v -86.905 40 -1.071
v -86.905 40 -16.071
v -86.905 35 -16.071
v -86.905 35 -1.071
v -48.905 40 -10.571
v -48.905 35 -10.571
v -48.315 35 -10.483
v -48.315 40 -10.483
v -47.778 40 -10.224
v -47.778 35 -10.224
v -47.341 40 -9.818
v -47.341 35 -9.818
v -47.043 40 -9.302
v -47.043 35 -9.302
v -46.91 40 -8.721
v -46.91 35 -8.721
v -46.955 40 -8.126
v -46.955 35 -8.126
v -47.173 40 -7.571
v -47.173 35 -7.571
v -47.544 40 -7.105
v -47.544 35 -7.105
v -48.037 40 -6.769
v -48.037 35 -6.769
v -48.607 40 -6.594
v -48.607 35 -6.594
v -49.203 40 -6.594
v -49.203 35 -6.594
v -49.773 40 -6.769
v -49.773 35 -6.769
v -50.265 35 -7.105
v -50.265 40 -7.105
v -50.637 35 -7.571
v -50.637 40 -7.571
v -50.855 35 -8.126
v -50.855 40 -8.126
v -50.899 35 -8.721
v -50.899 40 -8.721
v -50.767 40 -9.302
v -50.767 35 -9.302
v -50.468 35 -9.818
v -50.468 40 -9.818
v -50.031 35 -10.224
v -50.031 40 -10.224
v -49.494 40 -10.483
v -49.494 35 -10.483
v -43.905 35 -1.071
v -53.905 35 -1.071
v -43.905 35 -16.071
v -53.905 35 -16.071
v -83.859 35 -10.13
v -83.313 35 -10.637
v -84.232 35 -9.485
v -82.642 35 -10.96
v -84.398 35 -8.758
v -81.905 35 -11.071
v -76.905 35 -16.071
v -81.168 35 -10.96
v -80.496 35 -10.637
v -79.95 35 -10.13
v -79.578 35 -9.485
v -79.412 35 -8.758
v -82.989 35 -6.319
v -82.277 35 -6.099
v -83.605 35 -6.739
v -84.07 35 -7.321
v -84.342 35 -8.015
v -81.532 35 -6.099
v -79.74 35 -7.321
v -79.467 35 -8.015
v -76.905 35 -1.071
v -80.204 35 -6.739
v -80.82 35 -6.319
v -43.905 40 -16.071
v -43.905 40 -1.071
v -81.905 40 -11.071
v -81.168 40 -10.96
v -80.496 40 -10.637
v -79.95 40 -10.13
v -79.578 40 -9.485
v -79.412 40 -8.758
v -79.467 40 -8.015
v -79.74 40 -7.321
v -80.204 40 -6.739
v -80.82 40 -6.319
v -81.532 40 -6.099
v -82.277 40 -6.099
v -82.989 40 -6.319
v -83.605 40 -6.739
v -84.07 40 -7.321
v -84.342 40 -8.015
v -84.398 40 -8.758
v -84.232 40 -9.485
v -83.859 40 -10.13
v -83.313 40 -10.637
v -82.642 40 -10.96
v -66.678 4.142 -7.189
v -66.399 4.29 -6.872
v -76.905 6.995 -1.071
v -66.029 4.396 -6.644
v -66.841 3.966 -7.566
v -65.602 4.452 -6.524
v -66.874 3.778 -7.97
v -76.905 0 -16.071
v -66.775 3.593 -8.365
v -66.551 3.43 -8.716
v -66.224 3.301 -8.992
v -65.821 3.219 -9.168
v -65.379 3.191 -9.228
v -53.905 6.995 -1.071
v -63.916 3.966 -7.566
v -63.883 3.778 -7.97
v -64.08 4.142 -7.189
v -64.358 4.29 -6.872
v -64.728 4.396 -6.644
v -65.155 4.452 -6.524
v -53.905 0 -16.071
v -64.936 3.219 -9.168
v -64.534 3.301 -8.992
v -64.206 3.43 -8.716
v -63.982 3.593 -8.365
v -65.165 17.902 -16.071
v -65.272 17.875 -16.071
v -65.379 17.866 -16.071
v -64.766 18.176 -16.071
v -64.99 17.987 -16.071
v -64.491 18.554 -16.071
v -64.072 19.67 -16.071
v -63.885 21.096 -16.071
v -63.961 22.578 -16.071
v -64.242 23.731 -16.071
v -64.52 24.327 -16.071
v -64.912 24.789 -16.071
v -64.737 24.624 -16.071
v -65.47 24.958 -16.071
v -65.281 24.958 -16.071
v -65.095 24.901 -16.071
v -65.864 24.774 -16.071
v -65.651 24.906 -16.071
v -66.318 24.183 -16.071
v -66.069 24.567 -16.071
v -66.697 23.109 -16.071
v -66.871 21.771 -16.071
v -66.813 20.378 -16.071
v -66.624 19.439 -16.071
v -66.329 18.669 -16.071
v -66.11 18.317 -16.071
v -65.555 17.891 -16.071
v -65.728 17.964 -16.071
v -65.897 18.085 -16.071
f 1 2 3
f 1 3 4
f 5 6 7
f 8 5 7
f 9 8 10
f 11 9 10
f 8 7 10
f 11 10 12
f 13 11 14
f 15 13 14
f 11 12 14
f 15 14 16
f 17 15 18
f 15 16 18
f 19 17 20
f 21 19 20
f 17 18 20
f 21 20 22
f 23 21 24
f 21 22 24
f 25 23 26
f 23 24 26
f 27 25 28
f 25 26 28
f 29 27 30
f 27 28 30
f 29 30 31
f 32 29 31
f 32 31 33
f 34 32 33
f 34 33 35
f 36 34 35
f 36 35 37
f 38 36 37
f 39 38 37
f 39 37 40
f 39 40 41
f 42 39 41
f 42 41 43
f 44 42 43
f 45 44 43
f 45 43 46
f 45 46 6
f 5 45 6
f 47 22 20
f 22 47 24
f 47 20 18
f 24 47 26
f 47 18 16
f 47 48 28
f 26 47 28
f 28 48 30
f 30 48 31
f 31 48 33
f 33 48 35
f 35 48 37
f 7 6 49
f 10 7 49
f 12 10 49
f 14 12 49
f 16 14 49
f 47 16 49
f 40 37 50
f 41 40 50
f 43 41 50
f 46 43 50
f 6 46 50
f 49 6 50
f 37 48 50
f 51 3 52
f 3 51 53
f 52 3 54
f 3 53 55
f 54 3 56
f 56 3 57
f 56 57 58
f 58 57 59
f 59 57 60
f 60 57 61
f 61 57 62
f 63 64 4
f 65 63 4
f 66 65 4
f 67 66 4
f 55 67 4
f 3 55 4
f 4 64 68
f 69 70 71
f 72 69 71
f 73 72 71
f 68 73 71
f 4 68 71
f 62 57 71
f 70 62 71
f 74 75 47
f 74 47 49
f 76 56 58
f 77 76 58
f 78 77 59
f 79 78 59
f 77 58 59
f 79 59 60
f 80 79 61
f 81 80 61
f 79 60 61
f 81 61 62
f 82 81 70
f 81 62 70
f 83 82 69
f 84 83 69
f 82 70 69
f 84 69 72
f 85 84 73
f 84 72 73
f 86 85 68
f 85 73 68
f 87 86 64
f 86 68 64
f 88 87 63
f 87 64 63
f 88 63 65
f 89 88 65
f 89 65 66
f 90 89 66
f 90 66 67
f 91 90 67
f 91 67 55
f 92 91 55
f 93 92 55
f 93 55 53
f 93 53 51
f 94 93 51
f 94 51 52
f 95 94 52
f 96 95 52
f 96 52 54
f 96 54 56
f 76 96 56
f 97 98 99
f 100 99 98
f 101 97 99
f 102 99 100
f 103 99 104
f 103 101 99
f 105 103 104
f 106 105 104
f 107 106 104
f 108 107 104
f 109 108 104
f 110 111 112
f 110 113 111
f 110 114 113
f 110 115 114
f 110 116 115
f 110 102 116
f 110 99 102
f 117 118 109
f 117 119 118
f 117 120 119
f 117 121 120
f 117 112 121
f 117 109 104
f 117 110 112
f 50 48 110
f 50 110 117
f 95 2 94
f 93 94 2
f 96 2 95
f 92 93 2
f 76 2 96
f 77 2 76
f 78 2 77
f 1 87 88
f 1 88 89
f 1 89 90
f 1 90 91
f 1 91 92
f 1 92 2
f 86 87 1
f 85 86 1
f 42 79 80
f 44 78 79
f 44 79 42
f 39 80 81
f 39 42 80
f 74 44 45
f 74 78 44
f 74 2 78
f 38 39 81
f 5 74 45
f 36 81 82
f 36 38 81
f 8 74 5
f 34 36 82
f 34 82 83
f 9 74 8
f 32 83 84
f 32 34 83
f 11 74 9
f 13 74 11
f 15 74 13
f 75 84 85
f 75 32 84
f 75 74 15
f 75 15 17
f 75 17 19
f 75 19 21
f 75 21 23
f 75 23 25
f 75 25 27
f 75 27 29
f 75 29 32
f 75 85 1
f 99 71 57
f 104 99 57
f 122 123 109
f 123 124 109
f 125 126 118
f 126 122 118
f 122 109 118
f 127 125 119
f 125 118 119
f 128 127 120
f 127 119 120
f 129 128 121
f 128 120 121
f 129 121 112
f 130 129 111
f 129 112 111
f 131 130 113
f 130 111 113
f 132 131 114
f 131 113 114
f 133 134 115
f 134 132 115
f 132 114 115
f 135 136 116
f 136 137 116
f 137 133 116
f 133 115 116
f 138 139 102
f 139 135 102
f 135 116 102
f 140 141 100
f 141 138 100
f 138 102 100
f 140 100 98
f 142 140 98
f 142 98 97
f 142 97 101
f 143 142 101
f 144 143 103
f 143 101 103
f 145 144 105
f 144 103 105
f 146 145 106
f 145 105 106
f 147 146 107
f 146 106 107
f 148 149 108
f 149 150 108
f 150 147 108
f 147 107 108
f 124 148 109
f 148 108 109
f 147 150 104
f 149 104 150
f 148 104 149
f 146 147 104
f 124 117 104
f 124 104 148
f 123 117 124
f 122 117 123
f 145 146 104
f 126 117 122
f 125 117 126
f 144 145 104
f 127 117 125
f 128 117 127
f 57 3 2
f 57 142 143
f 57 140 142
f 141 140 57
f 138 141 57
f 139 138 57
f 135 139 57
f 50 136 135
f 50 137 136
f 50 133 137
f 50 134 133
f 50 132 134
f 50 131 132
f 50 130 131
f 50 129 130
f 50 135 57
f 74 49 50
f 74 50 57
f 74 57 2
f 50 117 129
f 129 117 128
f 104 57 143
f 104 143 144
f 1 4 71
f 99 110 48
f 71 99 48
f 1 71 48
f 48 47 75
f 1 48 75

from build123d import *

# Parameters (mm, degrees)
SKETCH1_W           = 23
SKETCH1_H           = 15
BOSS_EXTRUDE1_DEPTH = 40
CUT_EXTRUDE1_DEPTH  = 40
SKETCH3_R           = 1.5
CUT_EXTRUDE2_DEPTH  = 36
SKETCH4_W           = 15
SKETCH4_H           = 5
BOSS_EXTRUDE2_DEPTH = 10
SKETCH5_W           = 15
SKETCH5_H           = 5
BOSS_EXTRUDE3_DEPTH = 10
SKETCH6_R           = 2.5
SKETCH6_R_2         = 2
CUT_EXTRUDE3_DEPTH  = 10


with BuildPart() as part:
    # Sketch1 → Boss-Extrude1 (new body)
    with BuildSketch(Plane(origin=(0, 0, 0), x_dir=(1, 0, 0), z_dir=(0, 1, 0))):
        with Locations((-65.404761905, 8.571428571)):
            Rectangle(SKETCH1_W, SKETCH1_H)
    extrude(amount=BOSS_EXTRUDE1_DEPTH)

    # Sketch2 → Cut-Extrude1 (cut)
    with BuildSketch(Plane(origin=(-53.904761905, 0, 0), x_dir=(0, 0, -1), z_dir=(1, 0, 0))):
        Polygon((16.071428571, 0), (1.071428571, 0), (1.071428571, 6.994614872), align=None)
    extrude(amount=-CUT_EXTRUDE1_DEPTH, mode=Mode.SUBTRACT)

    # Sketch3 → Cut-Extrude2 (cut)
    with BuildSketch(Plane(origin=(0, 6.155714275, -2.870456708), x_dir=(1, 0, 0), z_dir=(0, -0.9063077870366528, 0.4226182617406934))):
        with Locations(Location((-65.378595466, -5.514992079, 0), (0, 0, 270))):
            Circle(SKETCH3_R)
    extrude(amount=-CUT_EXTRUDE2_DEPTH, mode=Mode.SUBTRACT)

    # Sketch4 → Boss-Extrude2 (add)
    with BuildSketch(Plane(origin=(-53.904761905, 0, 0), x_dir=(0, 0, -1), z_dir=(1, 0, 0))):
        with Locations((8.571428571, 37.5)):
            Rectangle(SKETCH4_W, SKETCH4_H)
    extrude(amount=BOSS_EXTRUDE2_DEPTH)

    # Sketch5 → Boss-Extrude3 (add)
    with BuildSketch(Plane.ZY.offset(76.904761905)):
        with Locations((-8.571428571, 37.5)):
            Rectangle(SKETCH5_W, SKETCH5_H)
    extrude(amount=BOSS_EXTRUDE3_DEPTH)

    # Sketch6 → Cut-Extrude3 (cut)
    with BuildSketch(Plane.XZ.offset(-35)):
        with Locations(Location((-81.904761905, -8.571428571, 0), (0, 0, 270))):
            Circle(SKETCH6_R)
        with Locations(Location((-48.904761905, -8.571428571, 0), (0, 0, 270))):
            Circle(SKETCH6_R_2)
    extrude(amount=-CUT_EXTRUDE3_DEPTH, mode=Mode.SUBTRACT)


solid = part.part
